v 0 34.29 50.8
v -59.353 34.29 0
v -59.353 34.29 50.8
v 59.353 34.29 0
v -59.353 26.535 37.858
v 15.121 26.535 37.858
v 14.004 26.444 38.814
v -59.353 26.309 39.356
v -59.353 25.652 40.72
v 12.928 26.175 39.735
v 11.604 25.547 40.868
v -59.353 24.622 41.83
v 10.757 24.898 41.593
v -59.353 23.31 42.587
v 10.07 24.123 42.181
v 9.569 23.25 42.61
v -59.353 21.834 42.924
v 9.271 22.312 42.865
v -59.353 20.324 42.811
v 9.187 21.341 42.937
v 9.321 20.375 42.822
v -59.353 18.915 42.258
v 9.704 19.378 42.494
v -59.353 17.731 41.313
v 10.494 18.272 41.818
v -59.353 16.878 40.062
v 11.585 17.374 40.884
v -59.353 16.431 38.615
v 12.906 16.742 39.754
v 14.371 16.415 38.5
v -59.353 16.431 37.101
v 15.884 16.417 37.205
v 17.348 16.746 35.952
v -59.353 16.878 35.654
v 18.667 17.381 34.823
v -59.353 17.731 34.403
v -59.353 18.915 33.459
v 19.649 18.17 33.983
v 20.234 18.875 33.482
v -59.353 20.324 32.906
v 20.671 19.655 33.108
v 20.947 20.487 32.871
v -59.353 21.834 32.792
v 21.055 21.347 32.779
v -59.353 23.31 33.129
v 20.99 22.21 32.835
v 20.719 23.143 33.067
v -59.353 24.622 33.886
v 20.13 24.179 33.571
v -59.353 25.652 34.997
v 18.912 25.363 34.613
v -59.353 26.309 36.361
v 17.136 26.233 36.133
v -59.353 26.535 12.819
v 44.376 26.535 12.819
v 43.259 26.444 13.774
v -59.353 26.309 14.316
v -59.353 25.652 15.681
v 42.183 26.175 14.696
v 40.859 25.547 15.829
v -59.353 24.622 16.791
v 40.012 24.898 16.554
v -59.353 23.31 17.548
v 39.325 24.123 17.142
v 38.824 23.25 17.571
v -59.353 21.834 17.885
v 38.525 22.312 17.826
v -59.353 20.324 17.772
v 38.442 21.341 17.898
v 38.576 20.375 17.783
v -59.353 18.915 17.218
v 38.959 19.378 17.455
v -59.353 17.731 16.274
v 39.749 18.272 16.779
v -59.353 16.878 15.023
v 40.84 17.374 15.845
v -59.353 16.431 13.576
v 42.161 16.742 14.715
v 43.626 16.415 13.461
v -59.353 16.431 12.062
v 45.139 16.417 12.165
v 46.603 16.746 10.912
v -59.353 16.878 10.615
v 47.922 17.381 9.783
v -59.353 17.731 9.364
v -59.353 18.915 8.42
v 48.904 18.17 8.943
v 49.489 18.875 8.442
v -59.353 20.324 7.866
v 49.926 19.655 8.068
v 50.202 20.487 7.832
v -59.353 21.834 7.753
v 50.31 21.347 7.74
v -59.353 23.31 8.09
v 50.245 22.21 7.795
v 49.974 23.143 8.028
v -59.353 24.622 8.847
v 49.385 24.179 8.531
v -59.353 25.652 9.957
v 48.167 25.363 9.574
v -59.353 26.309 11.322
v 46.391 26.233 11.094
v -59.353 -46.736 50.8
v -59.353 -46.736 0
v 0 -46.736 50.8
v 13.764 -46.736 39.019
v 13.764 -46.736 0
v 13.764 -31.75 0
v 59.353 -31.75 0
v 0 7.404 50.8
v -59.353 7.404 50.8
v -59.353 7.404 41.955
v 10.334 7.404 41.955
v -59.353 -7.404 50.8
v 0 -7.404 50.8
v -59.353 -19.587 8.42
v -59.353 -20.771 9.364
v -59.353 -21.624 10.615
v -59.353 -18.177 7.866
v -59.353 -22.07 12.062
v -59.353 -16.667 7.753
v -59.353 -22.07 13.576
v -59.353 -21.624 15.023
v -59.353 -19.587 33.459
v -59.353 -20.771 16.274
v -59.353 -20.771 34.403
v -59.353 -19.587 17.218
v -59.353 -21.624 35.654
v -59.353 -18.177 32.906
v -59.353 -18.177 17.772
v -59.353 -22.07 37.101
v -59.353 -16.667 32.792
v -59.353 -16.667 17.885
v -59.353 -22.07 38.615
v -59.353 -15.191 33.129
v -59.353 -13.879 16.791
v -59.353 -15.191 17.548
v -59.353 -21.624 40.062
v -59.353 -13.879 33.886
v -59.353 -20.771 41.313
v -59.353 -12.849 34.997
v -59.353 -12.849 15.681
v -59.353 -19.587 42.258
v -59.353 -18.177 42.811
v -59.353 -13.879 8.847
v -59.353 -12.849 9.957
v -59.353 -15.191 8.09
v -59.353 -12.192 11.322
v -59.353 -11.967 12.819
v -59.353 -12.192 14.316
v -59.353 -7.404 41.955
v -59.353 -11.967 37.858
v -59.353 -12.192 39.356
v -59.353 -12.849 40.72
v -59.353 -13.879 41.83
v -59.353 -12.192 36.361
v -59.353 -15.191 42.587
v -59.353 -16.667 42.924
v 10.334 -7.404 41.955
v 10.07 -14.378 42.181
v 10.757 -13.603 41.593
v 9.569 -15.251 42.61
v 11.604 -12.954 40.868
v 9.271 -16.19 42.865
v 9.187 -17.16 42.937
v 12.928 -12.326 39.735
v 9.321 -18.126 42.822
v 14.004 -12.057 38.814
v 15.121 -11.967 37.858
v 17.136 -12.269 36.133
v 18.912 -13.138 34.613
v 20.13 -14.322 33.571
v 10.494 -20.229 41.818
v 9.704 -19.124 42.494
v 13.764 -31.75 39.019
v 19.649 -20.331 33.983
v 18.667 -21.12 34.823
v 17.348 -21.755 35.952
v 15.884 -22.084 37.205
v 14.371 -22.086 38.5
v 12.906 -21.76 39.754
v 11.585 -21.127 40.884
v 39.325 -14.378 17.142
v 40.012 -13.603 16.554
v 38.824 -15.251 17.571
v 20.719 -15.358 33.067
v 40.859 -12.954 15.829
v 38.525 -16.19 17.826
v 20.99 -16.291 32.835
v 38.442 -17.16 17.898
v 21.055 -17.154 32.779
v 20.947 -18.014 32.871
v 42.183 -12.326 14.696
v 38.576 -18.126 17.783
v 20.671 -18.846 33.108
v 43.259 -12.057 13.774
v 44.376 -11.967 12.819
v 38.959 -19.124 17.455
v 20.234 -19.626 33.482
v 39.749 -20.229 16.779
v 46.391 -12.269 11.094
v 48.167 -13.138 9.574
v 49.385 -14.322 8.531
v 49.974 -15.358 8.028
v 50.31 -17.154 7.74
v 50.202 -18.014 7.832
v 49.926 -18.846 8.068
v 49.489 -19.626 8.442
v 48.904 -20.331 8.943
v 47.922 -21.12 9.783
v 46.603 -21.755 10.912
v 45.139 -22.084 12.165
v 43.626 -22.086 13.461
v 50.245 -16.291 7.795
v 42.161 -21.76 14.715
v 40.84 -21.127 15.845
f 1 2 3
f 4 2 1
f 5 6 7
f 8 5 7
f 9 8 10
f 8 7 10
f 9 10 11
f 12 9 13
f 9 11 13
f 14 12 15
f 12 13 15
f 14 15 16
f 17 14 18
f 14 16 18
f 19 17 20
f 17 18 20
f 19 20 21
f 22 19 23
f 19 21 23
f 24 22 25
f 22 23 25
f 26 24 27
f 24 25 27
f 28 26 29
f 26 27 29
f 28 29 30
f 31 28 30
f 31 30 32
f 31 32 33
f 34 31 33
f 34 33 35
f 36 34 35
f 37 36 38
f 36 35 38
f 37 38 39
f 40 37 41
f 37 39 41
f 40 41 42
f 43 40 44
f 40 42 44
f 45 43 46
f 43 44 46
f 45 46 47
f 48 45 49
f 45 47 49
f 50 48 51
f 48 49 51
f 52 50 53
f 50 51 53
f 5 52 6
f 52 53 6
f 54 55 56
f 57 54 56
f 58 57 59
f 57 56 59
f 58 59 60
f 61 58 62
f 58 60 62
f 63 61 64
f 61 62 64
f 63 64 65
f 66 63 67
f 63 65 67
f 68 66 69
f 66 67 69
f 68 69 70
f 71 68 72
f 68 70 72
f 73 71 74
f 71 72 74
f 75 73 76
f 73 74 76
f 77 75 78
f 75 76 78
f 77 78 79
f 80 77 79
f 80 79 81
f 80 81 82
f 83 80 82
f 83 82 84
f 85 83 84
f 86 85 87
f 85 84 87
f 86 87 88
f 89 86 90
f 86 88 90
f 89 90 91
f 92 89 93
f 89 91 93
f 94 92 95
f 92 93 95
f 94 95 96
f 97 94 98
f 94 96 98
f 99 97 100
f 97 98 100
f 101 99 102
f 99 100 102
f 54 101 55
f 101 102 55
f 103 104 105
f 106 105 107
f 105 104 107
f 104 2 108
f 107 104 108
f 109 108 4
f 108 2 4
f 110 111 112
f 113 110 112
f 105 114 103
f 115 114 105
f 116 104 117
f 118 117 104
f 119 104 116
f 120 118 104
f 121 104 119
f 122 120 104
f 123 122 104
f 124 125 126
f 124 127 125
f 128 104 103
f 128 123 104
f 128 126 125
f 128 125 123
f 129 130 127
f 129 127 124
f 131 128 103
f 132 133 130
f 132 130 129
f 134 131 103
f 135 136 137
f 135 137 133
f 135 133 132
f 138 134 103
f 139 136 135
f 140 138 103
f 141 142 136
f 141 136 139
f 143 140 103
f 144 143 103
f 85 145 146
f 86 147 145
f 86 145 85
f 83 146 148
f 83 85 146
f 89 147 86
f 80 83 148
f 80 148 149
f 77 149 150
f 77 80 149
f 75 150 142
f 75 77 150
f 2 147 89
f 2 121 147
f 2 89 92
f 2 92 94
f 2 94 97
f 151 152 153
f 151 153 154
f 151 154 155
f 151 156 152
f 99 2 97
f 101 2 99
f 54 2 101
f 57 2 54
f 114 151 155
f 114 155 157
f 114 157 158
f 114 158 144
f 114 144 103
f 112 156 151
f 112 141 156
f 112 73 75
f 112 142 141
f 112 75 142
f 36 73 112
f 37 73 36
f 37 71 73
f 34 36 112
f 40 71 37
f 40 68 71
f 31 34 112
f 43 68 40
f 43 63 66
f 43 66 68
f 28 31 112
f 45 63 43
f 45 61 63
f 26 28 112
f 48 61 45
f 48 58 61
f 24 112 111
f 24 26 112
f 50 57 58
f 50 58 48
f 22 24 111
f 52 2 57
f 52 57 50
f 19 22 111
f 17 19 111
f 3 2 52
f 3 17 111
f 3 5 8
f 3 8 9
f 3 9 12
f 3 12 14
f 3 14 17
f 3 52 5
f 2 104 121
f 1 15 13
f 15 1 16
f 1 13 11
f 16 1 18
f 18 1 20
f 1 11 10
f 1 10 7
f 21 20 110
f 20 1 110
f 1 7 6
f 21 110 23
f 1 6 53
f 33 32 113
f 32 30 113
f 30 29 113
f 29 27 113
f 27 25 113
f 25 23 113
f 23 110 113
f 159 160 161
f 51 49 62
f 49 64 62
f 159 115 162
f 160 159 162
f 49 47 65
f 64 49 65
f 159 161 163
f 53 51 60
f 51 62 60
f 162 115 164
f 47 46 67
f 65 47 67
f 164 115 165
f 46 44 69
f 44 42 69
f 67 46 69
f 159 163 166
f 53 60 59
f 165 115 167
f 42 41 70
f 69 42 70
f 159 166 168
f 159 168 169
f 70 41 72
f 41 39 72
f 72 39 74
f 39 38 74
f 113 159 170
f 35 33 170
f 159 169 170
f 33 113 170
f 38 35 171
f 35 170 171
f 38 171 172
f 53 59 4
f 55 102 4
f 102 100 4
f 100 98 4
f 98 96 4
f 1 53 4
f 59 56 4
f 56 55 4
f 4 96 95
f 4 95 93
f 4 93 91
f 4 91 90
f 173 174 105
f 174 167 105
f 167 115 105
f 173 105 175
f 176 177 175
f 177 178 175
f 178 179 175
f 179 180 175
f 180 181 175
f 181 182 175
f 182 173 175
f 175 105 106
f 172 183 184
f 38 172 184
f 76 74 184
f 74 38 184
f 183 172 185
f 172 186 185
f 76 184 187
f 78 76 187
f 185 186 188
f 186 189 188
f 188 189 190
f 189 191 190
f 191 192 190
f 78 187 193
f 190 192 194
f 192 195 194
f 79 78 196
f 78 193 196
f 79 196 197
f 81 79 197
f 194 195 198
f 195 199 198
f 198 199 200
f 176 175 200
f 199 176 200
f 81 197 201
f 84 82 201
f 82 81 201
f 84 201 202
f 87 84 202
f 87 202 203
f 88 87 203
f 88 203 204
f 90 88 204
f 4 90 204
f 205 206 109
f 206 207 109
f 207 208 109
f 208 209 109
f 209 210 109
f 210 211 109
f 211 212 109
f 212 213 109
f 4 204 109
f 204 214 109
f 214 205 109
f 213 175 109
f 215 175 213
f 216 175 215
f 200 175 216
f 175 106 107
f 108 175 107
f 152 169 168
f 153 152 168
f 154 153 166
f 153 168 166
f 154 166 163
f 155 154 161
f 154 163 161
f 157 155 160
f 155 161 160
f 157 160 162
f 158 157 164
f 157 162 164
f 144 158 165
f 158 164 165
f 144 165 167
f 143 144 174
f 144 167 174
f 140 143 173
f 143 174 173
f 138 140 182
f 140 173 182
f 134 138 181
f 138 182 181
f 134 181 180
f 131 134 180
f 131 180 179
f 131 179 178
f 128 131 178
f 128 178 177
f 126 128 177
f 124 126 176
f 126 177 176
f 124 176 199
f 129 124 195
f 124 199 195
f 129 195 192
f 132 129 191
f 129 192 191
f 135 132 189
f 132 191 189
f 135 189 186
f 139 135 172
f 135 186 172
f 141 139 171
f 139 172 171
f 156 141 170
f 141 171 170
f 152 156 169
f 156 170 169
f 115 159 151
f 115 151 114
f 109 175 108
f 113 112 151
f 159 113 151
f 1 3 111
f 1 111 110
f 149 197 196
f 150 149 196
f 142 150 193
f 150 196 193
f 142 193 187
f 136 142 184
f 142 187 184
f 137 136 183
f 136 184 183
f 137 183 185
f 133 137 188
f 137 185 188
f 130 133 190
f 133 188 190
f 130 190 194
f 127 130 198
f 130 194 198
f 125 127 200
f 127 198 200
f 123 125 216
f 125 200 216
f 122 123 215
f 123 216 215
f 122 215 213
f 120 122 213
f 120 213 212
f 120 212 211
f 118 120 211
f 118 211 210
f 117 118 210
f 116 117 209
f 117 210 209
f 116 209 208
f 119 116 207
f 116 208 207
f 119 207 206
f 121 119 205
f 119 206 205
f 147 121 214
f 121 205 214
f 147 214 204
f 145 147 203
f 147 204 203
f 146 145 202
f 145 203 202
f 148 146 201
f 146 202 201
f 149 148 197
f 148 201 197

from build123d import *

# Parameters (mm, degrees)
F0_W      = 118.7055855989
F0_H      = 68.5793161392
F1_DEPTH  = 50.8
F2_R      = 5.08
F2_R_2    = 5.0799985524
F3_DEPTH  = 101.6
F4_DEPTH  = 12.446
F5_DEPTH  = 82.042
F7_DEPTH  = 187.96
F9_DEPTH  = 14.986
F10_W     = 14.8076536134
F10_H     = 8.8449797213
F11_DEPTH = 191.262


with BuildPart() as f1:
    # F0 (on Top) → F1 (new body)
    with BuildSketch(Plane.XY):
        Rectangle(F0_W, F0_H)
    extrude(amount=F1_DEPTH)

    # F2 (on face) → F3 (cut)
    with BuildSketch(Plane.YZ.offset(59.3527927995)):
        with Locations((-17.0466899602, 12.81891503)):
            Circle(F2_R)
        with Locations((21.4545419486, 12.81891503)):
            Circle(F2_R_2)
        with Locations((21.4545419486, 37.8581796117)):
            Circle(F2_R)
        with Locations((-17.0466899602, 37.8581796117)):
            Circle(F2_R)
    extrude(amount=-F3_DEPTH, mode=Mode.SUBTRACT)

    # F4 (add): a face of the model
    f4_faces = [f1.faces().sort_by_distance(p)[0] for p in [
        (0, -34.2896580696, 25.4),
    ]]
    extrude(f4_faces, amount=F4_DEPTH)

    # F5 (cut): faces of the model
    f5_faces = [f1.faces().sort_by_distance(p)[0] for p in [
        (-42.2472072005, -17.0466899602, 37.8581796117),
        (-42.2472072005, 21.4545419486, 12.81891503),
        (-42.2472072005, -17.0466899602, 12.81891503),
        (-42.2472072005, 21.4545419486, 37.8581796117),
    ]]
    extrude(f5_faces, amount=-F5_DEPTH, mode=Mode.SUBTRACT)

    # F6 (on face) → F7 (cut)
    with BuildSketch(Plane.XZ.offset(46.7356580696)):
        Polygon((59.3527927995, 50.8), (0, 50.8), (59.3527927995, 0), align=None)
    extrude(amount=-F7_DEPTH, mode=Mode.SUBTRACT)

    # F8 (on face) → F9 (cut)
    with BuildSketch(Plane.XZ.offset(46.7356580696)):
        Polygon((59.3527927995, 0), (13.7639556508, 39.0194431959), (13.7639556508, 0), align=None)
    extrude(amount=-F9_DEPTH, mode=Mode.SUBTRACT)

    # F10 (on face) → F11 (cut)
    with BuildSketch(Plane(origin=(-59.3527927995, 0, 0), x_dir=(0, -1, 0), z_dir=(-1, 0, 0))):
        with Locations((0, 46.3775101393)):
            Rectangle(F10_W, F10_H)
        with Locations((0, 55.2224898607)):
            Rectangle(F10_W, F10_H)
    extrude(amount=-F11_DEPTH, mode=Mode.SUBTRACT)


solid = f1.part
